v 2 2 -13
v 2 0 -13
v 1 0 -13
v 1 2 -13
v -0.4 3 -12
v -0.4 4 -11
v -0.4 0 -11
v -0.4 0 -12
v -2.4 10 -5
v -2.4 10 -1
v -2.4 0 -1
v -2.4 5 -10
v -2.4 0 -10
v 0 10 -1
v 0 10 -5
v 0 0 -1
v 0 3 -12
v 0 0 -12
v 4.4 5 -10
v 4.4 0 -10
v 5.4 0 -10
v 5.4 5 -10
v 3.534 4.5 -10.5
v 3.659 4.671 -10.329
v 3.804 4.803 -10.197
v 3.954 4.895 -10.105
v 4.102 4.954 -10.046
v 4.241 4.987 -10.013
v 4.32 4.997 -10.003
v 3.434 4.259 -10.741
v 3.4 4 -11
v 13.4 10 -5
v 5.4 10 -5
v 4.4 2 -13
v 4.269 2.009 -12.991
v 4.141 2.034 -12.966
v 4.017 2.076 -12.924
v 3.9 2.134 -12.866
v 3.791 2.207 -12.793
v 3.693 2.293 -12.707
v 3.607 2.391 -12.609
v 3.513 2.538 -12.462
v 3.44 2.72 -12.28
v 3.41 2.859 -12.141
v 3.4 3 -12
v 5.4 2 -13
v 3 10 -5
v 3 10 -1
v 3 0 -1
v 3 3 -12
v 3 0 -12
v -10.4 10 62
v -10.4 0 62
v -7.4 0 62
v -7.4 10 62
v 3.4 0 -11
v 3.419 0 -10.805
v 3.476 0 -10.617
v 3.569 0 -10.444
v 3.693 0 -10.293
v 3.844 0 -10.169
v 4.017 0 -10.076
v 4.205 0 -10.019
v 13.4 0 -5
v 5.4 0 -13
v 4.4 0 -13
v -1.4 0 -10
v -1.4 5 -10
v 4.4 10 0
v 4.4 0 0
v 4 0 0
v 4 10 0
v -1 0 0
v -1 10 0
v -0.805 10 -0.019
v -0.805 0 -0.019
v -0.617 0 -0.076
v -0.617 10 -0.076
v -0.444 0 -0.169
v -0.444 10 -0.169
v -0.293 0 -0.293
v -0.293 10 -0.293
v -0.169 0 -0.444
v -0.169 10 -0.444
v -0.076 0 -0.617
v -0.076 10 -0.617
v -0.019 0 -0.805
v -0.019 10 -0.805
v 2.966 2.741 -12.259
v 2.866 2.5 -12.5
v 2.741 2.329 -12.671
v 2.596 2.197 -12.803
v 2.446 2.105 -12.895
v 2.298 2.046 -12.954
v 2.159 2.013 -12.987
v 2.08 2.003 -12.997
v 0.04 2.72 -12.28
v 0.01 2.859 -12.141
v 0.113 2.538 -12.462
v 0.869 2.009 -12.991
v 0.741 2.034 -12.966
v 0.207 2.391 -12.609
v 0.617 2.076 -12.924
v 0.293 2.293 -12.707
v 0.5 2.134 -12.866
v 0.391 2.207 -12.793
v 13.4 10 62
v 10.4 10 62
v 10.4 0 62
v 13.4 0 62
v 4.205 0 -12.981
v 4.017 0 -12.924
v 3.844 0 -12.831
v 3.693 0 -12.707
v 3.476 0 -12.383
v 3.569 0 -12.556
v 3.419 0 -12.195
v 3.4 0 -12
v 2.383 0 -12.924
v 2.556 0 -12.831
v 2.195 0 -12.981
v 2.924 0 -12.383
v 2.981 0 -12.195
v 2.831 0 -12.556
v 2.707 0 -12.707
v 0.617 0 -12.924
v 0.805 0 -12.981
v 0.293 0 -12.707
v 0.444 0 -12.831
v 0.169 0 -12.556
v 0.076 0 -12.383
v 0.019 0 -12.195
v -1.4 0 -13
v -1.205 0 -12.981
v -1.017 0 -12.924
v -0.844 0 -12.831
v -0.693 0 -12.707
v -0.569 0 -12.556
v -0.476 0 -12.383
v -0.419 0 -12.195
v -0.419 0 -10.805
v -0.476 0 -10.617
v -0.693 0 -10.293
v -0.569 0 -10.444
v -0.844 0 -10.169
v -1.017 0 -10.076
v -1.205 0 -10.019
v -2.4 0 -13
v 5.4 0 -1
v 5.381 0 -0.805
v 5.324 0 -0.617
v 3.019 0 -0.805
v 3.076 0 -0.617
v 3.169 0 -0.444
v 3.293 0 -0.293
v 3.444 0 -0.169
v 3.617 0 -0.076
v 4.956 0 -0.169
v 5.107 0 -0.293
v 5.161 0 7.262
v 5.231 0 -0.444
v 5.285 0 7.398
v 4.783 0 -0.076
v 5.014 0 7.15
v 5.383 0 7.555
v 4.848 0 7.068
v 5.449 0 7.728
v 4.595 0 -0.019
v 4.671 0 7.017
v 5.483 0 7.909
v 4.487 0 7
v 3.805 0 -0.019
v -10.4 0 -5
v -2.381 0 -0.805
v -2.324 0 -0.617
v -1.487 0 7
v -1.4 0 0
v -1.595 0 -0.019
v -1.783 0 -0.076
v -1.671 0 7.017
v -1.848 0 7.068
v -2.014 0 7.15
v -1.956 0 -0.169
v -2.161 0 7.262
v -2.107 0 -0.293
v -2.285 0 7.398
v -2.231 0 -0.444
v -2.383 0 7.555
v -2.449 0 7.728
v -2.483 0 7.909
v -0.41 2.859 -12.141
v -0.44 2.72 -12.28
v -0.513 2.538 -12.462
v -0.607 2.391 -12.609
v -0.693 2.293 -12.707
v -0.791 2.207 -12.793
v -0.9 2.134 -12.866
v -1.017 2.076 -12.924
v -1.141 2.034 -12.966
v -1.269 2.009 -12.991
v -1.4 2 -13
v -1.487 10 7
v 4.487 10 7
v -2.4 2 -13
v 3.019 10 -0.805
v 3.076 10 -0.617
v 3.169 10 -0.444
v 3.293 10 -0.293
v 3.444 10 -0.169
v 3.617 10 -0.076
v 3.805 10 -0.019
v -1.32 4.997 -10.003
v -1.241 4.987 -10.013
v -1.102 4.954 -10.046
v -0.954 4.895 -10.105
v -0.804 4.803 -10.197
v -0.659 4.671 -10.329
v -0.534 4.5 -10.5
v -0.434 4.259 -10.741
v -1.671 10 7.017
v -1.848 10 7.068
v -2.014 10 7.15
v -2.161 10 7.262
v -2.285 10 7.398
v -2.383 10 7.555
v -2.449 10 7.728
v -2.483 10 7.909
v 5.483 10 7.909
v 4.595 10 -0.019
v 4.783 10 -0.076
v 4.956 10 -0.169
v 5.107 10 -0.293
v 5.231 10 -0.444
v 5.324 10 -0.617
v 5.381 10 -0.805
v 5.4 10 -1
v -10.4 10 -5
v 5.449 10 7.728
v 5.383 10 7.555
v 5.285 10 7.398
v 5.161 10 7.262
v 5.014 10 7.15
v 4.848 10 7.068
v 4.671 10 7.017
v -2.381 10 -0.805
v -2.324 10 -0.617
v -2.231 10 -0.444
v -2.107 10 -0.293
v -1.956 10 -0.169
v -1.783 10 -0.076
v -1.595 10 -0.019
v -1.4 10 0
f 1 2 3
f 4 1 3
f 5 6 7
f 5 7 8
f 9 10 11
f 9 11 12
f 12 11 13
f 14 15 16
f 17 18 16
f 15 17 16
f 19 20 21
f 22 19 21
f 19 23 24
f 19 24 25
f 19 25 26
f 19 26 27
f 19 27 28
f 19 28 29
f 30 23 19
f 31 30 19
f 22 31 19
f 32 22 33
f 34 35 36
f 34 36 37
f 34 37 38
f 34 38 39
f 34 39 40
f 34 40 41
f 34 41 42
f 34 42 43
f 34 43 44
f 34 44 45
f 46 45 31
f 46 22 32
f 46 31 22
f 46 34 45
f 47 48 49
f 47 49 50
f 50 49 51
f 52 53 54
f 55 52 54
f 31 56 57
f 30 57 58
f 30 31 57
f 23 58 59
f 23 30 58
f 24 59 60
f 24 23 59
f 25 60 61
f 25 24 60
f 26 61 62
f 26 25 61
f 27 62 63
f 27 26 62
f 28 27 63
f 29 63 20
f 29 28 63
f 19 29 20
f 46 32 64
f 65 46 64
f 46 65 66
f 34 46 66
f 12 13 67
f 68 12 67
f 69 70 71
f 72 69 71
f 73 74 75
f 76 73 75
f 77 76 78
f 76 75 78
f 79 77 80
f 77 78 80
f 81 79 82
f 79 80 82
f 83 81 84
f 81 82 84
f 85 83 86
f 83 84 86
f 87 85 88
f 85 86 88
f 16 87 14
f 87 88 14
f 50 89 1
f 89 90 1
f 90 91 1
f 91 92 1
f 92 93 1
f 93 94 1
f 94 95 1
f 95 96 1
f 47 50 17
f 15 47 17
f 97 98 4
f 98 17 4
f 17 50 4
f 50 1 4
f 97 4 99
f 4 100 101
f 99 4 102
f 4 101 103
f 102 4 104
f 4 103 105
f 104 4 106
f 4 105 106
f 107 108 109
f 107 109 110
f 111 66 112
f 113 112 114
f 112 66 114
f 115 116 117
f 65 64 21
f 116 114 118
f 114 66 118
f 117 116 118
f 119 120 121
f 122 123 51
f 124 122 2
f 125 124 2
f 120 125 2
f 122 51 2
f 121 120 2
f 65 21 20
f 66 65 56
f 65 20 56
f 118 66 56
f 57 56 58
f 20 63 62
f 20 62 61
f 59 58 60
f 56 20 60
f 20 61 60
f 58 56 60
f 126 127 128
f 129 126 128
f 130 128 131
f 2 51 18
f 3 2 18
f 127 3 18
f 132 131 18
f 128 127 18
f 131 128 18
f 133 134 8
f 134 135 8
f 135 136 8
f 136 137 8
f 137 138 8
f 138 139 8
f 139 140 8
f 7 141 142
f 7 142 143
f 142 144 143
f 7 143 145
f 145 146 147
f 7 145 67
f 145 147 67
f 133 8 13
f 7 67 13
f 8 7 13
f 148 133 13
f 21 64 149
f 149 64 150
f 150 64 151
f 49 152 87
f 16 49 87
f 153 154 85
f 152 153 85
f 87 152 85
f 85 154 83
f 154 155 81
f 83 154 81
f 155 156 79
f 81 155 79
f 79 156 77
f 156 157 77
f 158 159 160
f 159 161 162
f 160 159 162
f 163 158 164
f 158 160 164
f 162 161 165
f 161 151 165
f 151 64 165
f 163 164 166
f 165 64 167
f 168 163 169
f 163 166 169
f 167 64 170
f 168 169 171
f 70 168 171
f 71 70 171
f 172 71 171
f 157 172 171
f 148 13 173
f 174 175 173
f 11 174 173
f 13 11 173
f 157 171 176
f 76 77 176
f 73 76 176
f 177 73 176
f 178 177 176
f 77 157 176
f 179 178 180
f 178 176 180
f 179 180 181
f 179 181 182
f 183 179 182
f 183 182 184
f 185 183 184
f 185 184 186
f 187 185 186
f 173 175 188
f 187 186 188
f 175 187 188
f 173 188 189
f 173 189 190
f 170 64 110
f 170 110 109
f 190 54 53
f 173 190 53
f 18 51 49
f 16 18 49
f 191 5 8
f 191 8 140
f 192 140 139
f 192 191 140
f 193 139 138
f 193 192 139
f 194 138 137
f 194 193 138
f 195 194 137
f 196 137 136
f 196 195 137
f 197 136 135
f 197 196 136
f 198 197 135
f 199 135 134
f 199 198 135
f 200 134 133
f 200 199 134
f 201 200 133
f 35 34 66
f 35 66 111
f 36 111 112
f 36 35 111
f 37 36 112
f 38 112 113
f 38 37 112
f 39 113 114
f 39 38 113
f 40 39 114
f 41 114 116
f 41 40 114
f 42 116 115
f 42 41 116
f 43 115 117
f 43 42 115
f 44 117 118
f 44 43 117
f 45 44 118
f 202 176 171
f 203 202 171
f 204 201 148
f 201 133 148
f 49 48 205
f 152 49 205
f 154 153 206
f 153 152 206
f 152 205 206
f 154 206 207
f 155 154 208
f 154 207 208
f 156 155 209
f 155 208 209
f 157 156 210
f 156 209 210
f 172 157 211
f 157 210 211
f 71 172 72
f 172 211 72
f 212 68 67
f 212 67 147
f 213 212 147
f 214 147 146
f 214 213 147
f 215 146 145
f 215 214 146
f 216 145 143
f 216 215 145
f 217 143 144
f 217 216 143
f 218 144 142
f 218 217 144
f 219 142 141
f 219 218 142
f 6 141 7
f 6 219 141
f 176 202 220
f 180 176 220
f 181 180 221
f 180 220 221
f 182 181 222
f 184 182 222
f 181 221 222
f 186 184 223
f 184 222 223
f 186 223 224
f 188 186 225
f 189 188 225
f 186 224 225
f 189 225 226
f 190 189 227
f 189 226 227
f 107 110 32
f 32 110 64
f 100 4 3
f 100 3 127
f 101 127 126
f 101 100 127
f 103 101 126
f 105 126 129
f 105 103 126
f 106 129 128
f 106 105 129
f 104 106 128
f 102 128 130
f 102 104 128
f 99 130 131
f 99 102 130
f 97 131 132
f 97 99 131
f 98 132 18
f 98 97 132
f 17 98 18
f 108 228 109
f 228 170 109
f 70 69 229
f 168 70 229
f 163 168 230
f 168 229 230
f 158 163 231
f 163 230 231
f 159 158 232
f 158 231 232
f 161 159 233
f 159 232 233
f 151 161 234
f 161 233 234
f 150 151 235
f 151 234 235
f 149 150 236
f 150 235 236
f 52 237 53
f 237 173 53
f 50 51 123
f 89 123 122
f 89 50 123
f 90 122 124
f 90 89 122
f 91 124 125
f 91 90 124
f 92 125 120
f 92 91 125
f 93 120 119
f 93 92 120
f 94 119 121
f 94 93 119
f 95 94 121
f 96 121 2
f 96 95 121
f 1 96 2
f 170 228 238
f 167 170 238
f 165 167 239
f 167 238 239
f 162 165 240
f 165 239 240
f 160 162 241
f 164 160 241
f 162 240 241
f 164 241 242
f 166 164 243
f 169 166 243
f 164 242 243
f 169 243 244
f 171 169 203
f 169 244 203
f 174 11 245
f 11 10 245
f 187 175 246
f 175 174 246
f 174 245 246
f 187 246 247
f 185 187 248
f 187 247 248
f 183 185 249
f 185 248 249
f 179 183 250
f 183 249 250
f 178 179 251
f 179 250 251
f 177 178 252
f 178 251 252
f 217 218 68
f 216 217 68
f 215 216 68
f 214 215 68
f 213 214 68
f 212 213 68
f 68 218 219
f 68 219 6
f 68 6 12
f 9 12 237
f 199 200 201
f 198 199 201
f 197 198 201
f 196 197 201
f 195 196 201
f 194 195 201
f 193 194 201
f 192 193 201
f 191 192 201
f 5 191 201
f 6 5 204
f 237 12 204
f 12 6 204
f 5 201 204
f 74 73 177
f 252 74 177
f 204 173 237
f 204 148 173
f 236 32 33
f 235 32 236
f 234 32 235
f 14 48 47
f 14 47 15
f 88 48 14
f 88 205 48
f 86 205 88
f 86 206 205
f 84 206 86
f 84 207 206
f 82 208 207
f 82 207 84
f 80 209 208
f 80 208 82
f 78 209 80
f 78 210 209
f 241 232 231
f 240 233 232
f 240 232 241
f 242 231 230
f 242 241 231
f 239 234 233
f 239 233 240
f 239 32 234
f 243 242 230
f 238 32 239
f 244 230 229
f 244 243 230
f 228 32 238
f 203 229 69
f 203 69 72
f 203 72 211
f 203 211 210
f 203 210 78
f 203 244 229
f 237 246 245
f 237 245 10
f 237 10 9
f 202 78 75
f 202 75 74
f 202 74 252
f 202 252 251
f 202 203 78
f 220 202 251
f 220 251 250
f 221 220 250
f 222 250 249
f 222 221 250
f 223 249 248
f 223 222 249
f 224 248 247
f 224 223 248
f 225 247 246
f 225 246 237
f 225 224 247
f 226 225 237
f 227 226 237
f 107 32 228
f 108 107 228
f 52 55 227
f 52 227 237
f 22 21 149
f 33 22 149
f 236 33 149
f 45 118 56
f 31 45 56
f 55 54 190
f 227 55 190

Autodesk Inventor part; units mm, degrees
ref_plane "YZ Plane" through (0, 0, 0) normal (1, 0, 0) x (0, 1, 0)
ref_plane "XZ Plane" through (0, 0, 0) normal (0, 1, 0) x (-1, 0, 0)
ref_plane "XY Plane" through (0, 0, 0) normal (0, 0, 1) x (1, 0, 0)
sketch "Sketch1" plane through (0, 0, 0) normal (0, 1, 0) x (-1, 0, 0)
  line L0 (-1.5, 7) -> (-1.5, -13)
  line L1 (-1.5, -13) -> (0, -13)
  line L2 (0, -13) -> (0, 0)
  line L3 (0, 0) -> (2.4, 0)
  line L4 (2.4, 0) -> (2.4, -10)
  line L5 (2.4, -10) -> (0.4, -10)
  line L6 (0.4, -10) -> (0.4, -13)
  line L7 (0.4, -13) -> (10.4, -13)
  line L8 (10.4, -13) -> (10.4, 62)
  line L9 (10.4, 62) -> (7.4, 62)
  line L10 (7.4, 62) -> (2.4, 7)
  line L11 (2.4, 7) -> (-1.5, 7)
  dimension "d0" = 0.4
  dimension "d1" = 2
  dimension "d2" = 10
  dimension "d3" = 75
  dimension "d4" = 7
  dimension "d5" = 10
  dimension "d6" = 3
  dimension "d7" = 1.5
  dimension "d14" = 3
extrude "Extrusion1" add sketch "Sketch1" along normal blind 10
mirror "Mirror1" about plane through (1.5, 0, 7) normal (1, 0, 0) of "Extrusion1"
chamfer "Chamfer1" distance 8 angle 45 5 edges at (-5.4, 10, -13) (1.5, 10, -13) (8.4, 10, -13) (13.4, 5, -13) (-10.4, 5, -13)
fillet "Fillet1" radius 1 12 edges at (-0.4, 1, -13) (0, 1, -13) (3.4, 1, -13) (3, 1, -13) (-0.4, 2.5, -10) (3.4, 2.5, -10) (5.4, 5, 0) (3, 5, 0) (0, 5, 0) (-2.4, 5, 0) (-2.4, 5, 7) (5.4, 5, 7)
properties part number "adjuster grip"
